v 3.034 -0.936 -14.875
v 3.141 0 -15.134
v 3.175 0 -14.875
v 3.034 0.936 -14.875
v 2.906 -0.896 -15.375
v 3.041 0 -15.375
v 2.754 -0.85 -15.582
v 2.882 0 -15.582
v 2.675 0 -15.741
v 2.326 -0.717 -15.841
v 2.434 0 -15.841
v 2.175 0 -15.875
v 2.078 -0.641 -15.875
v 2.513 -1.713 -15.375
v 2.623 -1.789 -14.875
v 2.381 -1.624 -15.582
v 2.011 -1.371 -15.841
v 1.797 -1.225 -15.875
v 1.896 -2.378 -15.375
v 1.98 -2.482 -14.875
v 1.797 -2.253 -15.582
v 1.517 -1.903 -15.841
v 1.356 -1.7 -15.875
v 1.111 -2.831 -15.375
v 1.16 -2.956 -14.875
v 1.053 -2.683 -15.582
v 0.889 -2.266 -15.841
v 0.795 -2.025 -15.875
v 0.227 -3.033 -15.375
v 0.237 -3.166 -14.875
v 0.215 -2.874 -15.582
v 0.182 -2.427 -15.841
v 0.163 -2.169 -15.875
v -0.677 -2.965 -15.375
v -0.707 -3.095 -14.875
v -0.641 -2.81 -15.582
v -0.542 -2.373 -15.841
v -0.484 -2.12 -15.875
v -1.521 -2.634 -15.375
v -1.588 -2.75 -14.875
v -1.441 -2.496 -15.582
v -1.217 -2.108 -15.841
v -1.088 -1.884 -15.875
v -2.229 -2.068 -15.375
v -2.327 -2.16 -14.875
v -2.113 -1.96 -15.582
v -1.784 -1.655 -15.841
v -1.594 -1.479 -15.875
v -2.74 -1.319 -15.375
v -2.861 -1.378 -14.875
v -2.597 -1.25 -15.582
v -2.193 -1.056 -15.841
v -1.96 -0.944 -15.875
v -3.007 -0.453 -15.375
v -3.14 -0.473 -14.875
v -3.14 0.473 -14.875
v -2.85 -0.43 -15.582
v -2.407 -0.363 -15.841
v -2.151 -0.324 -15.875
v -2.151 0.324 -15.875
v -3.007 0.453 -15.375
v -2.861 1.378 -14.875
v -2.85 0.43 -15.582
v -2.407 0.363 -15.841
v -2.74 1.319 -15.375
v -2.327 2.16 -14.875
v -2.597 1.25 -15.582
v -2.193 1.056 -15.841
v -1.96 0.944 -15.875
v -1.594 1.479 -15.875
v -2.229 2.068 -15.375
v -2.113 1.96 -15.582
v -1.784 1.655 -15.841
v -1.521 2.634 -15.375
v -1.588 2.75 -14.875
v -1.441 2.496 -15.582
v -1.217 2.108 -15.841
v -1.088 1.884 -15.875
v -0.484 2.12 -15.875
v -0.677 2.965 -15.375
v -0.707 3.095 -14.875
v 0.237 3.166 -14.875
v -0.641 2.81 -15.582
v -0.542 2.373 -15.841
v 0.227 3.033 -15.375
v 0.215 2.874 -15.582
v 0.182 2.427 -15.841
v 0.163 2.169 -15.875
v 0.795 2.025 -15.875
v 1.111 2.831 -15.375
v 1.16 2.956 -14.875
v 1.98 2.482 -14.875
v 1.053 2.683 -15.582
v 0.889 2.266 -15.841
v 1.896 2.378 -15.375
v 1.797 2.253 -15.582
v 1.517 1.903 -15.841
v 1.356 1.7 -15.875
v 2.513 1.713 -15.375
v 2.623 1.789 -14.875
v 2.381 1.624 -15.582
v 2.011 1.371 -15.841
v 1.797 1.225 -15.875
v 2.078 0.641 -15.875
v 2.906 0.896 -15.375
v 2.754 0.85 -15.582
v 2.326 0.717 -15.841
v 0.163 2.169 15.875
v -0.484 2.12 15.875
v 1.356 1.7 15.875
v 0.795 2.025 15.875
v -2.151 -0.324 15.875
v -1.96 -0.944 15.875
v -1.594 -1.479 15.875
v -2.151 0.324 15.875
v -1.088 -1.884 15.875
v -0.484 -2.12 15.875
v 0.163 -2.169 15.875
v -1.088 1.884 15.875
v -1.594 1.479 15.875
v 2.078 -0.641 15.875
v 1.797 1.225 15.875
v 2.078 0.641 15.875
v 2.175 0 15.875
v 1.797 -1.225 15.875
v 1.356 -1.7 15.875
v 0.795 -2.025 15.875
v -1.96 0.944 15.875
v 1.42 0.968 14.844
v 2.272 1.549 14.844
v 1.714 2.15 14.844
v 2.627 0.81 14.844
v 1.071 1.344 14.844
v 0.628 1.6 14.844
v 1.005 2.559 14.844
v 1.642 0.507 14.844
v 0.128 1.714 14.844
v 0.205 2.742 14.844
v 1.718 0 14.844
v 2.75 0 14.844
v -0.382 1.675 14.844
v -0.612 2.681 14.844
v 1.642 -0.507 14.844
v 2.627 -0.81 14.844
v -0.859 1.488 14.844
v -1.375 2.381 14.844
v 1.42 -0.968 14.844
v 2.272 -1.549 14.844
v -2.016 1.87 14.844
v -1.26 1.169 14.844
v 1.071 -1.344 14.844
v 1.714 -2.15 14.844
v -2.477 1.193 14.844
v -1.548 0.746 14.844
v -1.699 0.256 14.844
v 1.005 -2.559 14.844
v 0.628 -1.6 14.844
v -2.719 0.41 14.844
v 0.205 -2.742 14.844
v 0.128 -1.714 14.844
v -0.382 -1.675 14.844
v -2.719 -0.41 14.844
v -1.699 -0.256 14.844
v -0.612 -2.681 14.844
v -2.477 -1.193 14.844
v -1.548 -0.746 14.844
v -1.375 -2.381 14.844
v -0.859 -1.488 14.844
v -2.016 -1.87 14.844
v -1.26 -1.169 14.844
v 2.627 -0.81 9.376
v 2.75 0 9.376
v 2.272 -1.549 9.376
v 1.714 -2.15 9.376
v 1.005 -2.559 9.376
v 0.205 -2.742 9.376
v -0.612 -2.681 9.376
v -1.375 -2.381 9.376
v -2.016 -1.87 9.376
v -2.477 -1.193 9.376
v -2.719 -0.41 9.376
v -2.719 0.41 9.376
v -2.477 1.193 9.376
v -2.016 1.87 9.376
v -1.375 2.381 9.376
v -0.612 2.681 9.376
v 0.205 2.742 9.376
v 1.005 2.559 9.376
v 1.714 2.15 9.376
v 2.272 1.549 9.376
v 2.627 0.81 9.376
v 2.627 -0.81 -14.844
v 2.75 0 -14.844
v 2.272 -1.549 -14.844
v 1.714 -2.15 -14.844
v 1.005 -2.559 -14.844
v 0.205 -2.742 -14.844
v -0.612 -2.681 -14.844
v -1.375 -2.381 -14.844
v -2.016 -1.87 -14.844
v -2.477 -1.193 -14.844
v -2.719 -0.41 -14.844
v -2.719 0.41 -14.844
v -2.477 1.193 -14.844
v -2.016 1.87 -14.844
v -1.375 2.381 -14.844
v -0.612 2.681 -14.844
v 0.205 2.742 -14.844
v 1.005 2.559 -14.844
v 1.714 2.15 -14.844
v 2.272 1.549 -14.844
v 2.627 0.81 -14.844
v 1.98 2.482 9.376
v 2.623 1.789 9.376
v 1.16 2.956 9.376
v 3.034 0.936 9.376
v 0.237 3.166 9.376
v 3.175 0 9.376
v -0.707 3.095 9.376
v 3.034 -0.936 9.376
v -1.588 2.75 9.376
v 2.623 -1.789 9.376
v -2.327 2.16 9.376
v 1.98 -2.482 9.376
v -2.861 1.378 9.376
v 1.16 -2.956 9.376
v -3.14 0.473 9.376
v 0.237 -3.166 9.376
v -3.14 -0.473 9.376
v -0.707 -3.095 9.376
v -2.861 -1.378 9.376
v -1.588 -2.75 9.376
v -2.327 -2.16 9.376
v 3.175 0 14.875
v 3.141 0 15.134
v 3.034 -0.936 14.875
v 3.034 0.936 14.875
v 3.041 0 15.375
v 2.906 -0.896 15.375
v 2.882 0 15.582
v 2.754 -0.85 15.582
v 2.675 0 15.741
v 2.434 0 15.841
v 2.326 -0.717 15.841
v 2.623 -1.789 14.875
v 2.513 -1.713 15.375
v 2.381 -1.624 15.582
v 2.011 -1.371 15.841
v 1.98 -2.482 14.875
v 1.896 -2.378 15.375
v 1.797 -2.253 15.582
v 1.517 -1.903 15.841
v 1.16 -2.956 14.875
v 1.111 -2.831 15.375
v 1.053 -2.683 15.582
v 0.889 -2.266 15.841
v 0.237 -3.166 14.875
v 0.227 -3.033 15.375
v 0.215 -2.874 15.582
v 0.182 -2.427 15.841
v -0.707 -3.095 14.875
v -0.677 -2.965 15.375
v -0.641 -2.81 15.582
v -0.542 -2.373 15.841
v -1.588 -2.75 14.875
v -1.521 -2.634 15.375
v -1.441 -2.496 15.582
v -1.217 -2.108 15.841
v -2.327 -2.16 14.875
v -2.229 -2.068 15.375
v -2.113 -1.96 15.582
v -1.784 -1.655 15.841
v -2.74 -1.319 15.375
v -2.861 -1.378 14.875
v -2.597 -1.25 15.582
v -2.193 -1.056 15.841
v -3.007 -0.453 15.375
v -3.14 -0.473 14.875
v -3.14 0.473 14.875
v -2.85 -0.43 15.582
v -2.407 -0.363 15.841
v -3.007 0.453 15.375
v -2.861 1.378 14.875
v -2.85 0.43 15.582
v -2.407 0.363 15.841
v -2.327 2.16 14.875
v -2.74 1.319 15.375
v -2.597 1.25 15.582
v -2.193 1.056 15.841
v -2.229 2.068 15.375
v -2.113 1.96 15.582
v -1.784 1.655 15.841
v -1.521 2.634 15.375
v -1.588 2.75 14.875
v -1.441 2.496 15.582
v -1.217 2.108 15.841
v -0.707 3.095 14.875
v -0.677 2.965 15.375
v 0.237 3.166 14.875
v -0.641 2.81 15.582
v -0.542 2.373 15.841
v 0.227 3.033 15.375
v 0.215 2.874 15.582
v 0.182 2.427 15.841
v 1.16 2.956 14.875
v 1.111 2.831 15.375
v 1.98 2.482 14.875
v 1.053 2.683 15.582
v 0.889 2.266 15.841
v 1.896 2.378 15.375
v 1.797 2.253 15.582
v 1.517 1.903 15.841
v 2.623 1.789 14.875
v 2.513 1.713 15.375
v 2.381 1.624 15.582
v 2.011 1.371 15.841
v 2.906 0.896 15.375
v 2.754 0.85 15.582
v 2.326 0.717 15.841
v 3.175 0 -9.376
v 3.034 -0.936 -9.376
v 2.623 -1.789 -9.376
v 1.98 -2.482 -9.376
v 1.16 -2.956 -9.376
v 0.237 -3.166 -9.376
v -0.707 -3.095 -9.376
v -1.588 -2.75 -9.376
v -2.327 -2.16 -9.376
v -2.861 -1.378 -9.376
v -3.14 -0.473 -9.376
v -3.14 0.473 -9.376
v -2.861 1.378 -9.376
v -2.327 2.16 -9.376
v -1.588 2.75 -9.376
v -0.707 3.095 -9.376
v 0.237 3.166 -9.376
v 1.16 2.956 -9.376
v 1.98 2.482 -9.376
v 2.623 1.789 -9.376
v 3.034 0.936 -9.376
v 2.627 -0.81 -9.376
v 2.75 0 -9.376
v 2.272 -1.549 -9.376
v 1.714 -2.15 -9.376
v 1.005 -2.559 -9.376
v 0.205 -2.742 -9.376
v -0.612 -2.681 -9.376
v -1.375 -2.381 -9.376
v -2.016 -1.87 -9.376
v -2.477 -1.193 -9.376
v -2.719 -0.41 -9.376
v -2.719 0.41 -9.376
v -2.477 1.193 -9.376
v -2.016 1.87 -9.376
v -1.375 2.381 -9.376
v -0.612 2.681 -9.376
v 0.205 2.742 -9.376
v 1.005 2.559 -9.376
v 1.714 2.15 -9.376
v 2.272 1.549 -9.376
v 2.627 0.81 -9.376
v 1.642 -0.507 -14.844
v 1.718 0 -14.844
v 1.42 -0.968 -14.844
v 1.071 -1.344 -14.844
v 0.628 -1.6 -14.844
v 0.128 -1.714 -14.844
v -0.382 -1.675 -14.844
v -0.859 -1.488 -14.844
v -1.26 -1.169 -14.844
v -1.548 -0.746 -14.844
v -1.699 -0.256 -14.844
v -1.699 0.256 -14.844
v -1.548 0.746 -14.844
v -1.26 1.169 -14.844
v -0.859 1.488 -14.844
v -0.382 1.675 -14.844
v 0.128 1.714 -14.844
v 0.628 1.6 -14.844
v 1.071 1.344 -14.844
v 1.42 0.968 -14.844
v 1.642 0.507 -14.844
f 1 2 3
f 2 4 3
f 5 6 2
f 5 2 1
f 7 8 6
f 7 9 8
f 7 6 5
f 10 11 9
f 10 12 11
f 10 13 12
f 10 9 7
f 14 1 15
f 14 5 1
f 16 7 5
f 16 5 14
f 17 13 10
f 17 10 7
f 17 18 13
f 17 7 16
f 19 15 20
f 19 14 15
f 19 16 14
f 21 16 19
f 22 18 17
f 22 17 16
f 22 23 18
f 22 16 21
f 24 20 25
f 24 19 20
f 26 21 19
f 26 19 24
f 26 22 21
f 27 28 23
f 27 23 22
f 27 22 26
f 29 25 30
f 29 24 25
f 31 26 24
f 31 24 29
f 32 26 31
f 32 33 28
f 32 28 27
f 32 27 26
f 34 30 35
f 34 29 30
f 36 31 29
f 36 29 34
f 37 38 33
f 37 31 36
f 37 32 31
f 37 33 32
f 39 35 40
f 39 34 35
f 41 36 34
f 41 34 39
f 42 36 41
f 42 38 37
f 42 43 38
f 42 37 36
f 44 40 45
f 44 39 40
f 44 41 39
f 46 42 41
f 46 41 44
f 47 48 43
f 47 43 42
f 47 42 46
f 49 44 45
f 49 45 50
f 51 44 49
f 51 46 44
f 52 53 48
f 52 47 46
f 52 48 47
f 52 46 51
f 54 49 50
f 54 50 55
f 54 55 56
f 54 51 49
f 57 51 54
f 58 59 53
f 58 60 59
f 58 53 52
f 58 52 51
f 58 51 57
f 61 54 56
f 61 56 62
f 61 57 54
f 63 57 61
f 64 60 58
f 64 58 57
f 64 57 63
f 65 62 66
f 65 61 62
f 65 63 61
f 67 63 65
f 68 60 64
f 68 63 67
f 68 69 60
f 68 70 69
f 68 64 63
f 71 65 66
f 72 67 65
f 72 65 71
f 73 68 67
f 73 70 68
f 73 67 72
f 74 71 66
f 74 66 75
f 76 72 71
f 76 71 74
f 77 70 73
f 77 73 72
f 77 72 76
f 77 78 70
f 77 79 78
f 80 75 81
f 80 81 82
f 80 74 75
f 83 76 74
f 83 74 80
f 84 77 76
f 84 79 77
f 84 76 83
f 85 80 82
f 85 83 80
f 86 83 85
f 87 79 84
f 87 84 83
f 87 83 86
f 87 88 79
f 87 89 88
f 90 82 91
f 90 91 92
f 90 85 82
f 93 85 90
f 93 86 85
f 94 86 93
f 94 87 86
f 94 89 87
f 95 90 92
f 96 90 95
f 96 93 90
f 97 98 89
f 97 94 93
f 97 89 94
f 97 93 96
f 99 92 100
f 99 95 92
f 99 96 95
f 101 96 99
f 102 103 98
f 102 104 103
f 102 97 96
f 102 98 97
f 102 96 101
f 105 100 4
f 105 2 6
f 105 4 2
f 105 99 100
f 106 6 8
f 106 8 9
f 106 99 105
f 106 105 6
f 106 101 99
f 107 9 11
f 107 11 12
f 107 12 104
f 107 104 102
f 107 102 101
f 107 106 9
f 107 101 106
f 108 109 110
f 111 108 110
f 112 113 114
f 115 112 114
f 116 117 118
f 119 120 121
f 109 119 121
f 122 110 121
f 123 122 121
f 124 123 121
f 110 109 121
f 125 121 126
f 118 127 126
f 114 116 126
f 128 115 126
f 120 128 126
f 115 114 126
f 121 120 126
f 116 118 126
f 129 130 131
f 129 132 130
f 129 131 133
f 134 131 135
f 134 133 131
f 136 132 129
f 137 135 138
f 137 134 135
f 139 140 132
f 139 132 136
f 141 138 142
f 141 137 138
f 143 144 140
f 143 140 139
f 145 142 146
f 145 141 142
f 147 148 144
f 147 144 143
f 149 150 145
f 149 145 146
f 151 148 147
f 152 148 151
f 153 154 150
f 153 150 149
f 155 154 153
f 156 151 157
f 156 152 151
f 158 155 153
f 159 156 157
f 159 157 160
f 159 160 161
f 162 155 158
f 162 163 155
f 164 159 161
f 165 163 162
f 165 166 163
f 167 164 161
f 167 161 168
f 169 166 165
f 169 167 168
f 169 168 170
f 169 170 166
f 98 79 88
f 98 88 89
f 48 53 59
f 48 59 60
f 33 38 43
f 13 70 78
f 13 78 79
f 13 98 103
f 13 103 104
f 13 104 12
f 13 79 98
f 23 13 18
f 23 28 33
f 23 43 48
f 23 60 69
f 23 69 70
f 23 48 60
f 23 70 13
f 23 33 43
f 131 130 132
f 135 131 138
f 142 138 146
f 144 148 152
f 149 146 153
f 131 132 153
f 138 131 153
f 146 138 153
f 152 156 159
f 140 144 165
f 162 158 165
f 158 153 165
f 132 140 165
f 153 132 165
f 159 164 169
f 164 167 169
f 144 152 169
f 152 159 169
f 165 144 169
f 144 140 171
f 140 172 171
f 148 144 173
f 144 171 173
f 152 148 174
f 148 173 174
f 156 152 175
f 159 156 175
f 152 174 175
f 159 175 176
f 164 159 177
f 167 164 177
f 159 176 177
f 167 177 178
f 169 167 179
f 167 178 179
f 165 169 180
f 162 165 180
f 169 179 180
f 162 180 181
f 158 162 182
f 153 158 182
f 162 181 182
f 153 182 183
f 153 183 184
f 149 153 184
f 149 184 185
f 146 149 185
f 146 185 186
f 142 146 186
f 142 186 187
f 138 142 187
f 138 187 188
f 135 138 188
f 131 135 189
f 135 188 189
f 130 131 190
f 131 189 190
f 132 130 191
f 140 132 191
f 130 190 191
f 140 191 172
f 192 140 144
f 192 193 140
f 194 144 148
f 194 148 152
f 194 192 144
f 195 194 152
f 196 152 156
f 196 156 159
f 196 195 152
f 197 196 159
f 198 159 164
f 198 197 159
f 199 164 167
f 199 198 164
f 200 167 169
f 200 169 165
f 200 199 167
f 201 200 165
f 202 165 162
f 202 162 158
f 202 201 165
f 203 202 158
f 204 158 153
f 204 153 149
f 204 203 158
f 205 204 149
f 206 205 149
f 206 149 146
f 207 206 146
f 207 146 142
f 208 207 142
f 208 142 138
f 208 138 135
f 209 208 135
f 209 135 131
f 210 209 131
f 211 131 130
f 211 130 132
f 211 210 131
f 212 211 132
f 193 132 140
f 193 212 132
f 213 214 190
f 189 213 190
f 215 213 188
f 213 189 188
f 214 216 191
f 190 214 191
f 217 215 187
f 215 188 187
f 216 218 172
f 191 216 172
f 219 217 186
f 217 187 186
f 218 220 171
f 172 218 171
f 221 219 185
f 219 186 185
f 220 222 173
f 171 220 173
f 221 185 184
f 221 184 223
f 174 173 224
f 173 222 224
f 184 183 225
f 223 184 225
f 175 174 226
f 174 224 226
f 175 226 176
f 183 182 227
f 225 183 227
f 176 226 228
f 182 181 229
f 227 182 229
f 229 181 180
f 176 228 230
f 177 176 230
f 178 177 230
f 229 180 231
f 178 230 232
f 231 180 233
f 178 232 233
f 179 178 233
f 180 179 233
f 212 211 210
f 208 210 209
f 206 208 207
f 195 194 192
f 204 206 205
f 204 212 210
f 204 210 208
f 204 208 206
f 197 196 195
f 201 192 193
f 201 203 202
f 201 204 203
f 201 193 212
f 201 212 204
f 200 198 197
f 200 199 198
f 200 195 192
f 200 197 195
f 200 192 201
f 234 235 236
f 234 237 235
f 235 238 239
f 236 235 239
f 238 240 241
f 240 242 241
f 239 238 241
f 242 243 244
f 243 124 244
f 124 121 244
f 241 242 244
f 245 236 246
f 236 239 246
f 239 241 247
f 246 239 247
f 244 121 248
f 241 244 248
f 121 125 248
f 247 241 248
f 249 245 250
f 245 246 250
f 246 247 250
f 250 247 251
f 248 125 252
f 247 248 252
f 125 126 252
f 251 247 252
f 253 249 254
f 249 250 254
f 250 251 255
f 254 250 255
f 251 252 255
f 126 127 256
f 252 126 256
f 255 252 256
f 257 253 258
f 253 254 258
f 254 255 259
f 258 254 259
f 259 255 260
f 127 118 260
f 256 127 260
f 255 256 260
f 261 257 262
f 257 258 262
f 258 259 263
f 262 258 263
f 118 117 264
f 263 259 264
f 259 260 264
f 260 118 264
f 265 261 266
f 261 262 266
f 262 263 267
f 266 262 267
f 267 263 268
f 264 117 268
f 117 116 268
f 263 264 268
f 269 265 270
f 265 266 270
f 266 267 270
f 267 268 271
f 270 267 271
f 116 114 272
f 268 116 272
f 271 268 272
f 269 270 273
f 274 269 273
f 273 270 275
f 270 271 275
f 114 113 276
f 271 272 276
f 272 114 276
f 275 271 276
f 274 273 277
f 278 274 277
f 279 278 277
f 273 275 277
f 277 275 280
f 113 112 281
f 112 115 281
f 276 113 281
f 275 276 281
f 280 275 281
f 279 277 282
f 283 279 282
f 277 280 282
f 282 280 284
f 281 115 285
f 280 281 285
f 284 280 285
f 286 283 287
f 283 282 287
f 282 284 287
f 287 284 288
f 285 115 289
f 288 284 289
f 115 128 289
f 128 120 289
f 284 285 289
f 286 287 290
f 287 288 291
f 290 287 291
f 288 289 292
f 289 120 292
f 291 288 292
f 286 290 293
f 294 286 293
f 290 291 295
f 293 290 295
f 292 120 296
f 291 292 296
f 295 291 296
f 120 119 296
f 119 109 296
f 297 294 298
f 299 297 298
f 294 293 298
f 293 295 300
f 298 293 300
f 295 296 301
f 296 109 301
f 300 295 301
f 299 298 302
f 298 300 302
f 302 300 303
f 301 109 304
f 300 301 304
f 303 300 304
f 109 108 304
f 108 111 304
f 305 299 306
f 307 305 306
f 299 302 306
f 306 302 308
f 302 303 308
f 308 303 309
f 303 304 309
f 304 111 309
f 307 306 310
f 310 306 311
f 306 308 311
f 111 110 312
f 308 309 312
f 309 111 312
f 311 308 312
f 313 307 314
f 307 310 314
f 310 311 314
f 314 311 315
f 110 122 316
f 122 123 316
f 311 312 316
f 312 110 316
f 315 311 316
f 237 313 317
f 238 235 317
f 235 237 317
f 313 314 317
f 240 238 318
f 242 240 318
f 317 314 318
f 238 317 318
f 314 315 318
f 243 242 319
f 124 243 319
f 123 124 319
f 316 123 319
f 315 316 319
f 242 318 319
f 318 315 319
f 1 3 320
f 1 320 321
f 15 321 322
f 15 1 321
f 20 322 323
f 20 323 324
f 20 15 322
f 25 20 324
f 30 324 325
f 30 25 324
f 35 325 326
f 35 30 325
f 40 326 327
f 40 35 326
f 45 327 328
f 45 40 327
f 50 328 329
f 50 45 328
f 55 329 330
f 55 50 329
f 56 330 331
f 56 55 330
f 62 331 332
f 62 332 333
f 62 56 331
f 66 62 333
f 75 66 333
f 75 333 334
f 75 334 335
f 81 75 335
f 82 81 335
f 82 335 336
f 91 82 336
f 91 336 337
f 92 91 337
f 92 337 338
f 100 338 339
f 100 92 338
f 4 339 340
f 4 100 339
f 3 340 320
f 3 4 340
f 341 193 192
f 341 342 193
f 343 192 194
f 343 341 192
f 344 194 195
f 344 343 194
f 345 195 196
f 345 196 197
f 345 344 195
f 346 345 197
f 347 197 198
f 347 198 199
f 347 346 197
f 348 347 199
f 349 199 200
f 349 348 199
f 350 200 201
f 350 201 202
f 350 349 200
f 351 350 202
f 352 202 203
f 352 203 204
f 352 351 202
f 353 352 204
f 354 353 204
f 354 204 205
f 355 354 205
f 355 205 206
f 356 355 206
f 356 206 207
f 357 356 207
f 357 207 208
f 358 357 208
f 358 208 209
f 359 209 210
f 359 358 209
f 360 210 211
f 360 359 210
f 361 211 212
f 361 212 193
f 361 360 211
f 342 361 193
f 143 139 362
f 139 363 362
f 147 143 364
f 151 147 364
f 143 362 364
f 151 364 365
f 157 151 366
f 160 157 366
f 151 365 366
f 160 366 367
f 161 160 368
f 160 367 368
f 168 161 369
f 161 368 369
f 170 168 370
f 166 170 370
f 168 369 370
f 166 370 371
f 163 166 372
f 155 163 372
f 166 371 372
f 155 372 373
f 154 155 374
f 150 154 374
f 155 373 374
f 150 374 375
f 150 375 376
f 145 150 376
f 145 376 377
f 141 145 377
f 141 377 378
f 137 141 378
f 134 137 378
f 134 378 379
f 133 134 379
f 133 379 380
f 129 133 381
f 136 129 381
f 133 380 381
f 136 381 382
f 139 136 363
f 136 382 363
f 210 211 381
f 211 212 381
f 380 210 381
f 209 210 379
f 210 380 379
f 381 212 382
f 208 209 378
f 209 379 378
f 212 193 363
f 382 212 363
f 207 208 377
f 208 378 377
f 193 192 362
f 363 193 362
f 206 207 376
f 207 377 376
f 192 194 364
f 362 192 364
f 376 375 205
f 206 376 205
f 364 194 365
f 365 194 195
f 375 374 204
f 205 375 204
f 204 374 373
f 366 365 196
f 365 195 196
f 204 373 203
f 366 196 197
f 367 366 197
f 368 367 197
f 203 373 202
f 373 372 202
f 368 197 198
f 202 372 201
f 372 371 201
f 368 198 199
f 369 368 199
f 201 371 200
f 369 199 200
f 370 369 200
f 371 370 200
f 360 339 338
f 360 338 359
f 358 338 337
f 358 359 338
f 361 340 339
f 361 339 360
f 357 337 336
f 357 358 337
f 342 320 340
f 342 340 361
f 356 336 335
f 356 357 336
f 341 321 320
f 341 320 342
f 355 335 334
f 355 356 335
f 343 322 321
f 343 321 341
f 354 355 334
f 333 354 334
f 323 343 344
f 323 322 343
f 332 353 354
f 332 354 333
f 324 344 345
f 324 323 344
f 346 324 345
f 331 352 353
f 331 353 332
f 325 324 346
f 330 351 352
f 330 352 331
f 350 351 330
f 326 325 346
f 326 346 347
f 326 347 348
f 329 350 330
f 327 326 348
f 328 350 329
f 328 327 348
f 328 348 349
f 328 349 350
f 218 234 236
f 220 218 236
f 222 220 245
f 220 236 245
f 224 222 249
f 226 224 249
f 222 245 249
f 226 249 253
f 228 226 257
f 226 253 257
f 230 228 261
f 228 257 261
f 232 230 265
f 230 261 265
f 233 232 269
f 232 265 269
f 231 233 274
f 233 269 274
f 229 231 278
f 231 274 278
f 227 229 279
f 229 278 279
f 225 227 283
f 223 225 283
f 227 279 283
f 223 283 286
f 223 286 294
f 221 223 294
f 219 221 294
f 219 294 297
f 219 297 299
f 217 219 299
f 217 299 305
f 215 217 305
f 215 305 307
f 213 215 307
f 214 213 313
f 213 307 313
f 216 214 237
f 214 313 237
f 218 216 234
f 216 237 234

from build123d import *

# Parameters (mm, degrees)
SKETCH3_W = 29.6878375
SKETCH3_H = 1.03108125
FILLET1_R = 1


with BuildPart() as part:
    # Sketch3 → Revolve1 (revolve)
    with BuildSketch(Plane(origin=(0, 0, 0), x_dir=(0, 0, -1), z_dir=(1, 0, 0)), mode=Mode.PRIVATE) as revolve1_sk:
        with Locations((0, 2.234009375)):
            Rectangle(SKETCH3_W, SKETCH3_H)
    revolve(revolve1_sk.sketch.rotate(Axis((0, 0, 15.875), (0, 0, -1)), 90), axis=Axis((0, 0, 15.875), (0, 0, -1)))


with BuildPart() as body_2:
    # Sketch4 → Revolve2 (revolve)
    with BuildSketch(Plane(origin=(0, 0, 0), x_dir=(0, 0, -1), z_dir=(1, 0, 0)), mode=Mode.PRIVATE) as revolve2_sk:
        Polygon((-9.375775, 2.74955), (-9.375775, 3.175), (-15.875, 3.175), (-15.875, 0), (-14.84391875, 0), (-14.84391875, 2.74955), align=None)
    revolve(revolve2_sk.sketch.rotate(Axis((0, 0, 15.875), (0, 0, -1)), 90), axis=Axis((0, 0, 15.875), (0, 0, -1)))

    # Fillet1
    fillet1_edges = [body_2.edges().sort_by_distance(p)[0] for p in [
        (-3.175, 0, 15.875),
    ]]
    fillet(fillet1_edges, radius=FILLET1_R)


with BuildPart() as body_3:
    # Mirror1: mirrored copy
    add(body_2.part.mirror(Plane.XY))


solid = Compound([part.part, body_2.part, body_3.part])
